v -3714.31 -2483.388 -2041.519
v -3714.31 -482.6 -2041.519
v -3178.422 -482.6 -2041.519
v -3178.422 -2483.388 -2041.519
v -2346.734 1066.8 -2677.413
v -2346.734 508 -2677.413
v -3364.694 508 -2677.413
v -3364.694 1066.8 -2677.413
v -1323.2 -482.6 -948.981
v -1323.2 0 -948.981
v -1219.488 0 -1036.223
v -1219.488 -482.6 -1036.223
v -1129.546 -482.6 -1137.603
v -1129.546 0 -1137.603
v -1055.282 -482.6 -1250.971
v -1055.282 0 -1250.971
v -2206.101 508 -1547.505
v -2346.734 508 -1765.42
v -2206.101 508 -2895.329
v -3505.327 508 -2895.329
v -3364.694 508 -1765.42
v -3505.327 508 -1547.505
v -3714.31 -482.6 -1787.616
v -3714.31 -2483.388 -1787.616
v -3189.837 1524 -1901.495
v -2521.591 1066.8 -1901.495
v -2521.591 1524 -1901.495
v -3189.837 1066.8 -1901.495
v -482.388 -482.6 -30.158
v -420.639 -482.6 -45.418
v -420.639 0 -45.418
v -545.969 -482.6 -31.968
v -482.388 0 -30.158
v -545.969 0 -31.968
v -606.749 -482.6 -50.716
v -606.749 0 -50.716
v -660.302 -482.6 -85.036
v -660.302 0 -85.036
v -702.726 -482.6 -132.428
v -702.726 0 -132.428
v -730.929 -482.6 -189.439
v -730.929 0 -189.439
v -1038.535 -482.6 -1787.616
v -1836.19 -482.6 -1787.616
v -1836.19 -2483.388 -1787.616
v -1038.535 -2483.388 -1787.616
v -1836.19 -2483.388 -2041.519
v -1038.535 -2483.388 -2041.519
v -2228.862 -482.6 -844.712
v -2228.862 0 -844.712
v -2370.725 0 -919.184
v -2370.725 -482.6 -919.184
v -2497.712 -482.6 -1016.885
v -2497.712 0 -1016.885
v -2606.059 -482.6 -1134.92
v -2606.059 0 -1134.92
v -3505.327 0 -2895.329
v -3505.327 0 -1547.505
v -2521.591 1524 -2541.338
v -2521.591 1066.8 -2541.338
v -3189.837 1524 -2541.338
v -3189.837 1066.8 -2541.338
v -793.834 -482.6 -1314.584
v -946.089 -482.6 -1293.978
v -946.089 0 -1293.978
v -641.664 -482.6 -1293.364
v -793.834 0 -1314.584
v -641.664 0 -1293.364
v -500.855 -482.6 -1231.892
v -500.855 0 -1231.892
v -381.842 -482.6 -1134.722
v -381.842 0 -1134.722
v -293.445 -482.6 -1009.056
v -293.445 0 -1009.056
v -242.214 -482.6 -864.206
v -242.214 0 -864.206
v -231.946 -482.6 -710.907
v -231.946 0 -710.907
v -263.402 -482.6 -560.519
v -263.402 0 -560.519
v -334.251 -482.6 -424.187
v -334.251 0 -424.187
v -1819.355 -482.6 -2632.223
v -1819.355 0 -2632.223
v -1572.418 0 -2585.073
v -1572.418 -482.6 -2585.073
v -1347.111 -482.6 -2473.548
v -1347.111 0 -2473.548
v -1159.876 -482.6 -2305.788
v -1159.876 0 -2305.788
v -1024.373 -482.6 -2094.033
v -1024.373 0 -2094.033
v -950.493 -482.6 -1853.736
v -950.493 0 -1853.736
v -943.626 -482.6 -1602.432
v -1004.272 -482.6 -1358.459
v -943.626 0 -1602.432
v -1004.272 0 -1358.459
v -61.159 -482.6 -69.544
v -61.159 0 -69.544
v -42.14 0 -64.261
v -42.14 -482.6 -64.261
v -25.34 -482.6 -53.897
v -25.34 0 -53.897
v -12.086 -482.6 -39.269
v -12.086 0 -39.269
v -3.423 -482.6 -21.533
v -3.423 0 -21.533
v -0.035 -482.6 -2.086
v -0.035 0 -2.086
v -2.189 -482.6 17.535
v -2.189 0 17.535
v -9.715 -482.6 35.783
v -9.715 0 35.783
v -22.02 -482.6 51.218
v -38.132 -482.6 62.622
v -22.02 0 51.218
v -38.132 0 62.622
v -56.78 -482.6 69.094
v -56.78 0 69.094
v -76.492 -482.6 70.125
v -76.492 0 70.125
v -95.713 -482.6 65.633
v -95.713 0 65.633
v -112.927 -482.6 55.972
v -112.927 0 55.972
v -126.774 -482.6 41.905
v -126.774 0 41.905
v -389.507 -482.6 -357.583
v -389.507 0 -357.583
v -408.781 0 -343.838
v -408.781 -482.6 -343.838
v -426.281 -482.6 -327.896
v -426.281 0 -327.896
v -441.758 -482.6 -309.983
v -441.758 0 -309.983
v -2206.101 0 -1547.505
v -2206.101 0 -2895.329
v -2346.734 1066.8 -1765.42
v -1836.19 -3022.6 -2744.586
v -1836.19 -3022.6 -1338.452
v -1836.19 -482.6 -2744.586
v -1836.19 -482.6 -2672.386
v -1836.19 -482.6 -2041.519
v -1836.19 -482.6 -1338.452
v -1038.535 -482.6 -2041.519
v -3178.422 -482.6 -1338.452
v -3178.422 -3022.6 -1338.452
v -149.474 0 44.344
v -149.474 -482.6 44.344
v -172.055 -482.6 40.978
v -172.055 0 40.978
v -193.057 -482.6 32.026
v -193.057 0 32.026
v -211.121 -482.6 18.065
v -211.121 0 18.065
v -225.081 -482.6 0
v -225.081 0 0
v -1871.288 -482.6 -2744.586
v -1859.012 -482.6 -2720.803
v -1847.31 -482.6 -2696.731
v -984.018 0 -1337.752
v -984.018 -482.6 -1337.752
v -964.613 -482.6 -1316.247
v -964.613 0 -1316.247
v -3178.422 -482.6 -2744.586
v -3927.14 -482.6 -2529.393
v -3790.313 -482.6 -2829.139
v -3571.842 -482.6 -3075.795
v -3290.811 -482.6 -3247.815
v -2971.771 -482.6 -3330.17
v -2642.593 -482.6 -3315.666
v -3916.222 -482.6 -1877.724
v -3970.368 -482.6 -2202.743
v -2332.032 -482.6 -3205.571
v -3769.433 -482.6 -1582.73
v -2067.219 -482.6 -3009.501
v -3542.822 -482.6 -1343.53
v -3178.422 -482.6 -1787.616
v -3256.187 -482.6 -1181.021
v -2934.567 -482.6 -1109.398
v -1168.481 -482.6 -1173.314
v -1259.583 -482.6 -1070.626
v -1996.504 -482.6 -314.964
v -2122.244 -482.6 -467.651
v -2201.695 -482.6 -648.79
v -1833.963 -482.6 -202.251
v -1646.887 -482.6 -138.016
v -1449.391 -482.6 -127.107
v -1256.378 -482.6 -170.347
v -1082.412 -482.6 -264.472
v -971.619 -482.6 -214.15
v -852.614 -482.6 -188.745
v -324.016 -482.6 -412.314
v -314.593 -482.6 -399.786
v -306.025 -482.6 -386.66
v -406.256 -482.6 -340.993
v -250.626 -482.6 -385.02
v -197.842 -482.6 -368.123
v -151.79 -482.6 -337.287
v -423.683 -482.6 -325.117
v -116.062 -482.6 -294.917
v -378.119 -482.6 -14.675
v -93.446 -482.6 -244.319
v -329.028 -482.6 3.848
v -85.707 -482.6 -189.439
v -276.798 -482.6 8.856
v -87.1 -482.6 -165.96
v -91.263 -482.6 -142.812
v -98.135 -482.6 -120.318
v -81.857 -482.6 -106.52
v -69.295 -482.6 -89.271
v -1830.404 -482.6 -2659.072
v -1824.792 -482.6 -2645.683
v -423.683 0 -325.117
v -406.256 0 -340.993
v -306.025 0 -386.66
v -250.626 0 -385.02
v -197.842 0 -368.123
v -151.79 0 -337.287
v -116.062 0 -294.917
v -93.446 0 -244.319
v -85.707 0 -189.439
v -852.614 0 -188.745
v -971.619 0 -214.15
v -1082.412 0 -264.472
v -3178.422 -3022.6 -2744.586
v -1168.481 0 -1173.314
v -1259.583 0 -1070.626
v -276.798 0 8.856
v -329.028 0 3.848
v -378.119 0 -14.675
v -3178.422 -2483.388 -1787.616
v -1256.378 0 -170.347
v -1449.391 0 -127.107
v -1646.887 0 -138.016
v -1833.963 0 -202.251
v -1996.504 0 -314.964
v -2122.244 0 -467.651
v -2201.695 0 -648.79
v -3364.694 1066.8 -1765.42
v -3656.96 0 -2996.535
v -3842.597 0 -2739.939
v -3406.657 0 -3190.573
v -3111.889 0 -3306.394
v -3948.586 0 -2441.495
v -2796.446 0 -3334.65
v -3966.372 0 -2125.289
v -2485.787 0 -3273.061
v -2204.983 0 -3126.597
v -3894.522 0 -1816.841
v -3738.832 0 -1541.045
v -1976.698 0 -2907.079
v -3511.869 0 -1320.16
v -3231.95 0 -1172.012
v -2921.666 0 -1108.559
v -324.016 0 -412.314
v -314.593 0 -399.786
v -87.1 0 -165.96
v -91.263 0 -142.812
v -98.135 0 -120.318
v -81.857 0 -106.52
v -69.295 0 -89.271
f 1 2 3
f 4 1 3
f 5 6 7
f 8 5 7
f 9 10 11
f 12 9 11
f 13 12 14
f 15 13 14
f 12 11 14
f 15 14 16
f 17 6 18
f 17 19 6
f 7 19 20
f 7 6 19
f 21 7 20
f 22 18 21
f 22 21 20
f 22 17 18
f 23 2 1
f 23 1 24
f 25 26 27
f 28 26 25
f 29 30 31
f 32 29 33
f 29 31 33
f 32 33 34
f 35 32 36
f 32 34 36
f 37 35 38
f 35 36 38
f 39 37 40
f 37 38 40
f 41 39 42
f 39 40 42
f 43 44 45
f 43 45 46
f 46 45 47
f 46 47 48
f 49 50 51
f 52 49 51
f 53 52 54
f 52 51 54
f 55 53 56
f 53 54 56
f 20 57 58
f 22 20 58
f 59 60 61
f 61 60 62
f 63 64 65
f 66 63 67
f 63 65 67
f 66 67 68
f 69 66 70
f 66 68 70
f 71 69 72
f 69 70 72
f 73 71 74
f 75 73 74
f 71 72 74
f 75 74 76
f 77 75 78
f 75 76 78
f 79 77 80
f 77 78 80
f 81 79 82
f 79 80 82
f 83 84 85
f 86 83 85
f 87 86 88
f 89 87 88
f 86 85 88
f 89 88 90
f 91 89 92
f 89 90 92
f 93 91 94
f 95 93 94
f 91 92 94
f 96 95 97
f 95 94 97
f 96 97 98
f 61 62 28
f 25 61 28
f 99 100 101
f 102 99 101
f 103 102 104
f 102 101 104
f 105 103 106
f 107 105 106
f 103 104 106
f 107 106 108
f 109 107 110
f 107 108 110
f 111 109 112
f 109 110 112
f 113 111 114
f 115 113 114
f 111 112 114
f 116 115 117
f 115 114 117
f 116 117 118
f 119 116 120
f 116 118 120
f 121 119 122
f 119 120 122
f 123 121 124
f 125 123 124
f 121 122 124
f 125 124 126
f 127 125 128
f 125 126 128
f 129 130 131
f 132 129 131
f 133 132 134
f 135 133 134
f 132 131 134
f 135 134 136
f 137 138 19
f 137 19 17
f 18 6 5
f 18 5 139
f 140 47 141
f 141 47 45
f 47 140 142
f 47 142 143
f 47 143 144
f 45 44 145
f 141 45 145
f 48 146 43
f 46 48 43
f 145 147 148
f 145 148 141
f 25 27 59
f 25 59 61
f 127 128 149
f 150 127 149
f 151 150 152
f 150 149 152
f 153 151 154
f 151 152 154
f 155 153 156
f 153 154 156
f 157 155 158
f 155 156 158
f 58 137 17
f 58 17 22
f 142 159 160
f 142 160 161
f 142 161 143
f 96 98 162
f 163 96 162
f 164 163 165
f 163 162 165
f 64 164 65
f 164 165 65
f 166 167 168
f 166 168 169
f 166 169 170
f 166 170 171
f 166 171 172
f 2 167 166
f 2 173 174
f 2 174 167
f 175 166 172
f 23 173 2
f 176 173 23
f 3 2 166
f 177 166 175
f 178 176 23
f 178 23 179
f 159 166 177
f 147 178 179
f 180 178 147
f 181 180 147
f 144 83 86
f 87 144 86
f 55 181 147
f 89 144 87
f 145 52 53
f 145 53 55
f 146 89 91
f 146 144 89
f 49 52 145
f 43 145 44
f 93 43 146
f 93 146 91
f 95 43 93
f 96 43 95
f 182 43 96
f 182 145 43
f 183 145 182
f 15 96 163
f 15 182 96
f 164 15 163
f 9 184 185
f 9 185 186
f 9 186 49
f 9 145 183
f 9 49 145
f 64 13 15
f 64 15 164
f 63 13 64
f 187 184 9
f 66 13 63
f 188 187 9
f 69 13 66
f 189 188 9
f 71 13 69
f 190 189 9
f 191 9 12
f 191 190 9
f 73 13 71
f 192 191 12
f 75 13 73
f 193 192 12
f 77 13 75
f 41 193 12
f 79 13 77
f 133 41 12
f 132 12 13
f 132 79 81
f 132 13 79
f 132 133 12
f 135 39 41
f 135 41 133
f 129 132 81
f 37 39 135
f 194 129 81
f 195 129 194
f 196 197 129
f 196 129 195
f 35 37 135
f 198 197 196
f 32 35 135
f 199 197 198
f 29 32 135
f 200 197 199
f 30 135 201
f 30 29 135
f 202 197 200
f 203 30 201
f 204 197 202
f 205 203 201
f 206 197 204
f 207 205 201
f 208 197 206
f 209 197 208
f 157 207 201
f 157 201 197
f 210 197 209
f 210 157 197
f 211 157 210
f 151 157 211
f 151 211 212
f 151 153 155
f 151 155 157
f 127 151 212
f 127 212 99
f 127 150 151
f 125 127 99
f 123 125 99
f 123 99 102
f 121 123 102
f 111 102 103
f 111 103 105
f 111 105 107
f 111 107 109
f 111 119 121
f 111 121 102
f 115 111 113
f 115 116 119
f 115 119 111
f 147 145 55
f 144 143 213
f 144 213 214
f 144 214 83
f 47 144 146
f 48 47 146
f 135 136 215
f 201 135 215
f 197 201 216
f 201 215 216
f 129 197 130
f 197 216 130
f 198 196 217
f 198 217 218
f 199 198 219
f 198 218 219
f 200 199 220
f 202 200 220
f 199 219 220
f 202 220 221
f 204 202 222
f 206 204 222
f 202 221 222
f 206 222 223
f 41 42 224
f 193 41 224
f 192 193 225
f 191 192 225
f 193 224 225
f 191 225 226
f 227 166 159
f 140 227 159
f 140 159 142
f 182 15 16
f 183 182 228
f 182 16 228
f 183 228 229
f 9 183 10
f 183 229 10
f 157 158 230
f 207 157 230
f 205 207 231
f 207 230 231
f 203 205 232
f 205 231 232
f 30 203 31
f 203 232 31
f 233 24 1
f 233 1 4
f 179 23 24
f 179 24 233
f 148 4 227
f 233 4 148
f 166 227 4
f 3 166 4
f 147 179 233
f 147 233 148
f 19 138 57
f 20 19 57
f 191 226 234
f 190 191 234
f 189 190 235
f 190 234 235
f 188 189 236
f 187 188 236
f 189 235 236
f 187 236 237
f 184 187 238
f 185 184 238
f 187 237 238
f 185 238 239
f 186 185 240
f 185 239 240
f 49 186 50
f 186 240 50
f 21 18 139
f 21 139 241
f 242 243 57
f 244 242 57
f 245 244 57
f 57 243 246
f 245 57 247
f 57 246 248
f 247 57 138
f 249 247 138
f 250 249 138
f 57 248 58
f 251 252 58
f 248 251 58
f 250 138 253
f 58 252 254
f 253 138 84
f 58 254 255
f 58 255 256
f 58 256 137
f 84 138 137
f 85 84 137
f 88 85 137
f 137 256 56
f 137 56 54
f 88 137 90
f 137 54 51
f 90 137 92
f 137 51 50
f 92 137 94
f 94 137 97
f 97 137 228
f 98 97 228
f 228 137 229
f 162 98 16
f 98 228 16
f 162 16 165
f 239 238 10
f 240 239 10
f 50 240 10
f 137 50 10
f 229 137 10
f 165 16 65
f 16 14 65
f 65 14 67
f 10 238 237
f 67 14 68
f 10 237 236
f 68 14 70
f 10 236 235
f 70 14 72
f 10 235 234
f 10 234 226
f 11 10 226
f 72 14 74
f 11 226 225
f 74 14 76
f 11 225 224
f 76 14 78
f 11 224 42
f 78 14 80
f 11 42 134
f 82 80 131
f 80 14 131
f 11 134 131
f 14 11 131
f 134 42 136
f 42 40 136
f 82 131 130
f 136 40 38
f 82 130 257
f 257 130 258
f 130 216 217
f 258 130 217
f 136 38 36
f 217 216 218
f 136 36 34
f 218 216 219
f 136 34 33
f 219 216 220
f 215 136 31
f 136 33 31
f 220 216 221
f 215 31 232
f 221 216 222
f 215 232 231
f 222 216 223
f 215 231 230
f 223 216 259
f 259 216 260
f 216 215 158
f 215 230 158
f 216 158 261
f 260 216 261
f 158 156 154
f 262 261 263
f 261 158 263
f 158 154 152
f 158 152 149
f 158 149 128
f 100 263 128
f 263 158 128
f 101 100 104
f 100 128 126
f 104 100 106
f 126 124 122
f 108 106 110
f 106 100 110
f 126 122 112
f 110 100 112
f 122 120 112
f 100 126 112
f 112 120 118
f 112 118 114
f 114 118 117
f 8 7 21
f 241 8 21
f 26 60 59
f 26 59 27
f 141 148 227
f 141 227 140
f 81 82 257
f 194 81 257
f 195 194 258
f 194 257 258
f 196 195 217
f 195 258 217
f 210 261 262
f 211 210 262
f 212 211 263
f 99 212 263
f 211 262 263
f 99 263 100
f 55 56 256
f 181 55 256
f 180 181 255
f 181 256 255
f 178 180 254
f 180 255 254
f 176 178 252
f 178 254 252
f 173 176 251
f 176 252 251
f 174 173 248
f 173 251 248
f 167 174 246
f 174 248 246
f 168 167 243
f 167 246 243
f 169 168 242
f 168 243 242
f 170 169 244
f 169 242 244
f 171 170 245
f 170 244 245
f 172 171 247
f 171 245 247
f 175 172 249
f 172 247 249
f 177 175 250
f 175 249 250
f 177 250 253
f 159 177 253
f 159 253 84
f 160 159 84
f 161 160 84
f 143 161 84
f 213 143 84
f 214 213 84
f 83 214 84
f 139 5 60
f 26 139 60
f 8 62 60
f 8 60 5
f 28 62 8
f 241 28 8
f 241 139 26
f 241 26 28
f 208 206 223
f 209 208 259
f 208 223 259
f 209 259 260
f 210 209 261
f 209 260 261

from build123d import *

# Parameters (mm, degrees)
F1_DEPTH = 482.6
F2_W     = 2675.7745742798
F2_H     = 253.9026737213
F3_DEPTH = 2000.7876753807
F4_W     = 1342.2315120697
F4_H     = 1406.1346054077
F5_DEPTH = 2540
F6_W     = 668.2456359944
F6_H     = 639.8428811592
F7_DEPTH = 1524
F6_W_2   = 1017.9599151692
F6_H_2   = 911.9933976692
F8_DEPTH = 1066.8
F6_W_3   = 1299.2261276326
F6_H_3   = 1347.8239907784
F9_DEPTH = 508


with BuildPart() as f1:
    # F0 (on Front) → F1 (new body)
    with BuildSketch(Plane.XZ):
        with BuildLine():
            ThreePointArc((-61.1587813421, -69.5440271721), (-17.4584032056, -46.2229366547), (0.0001243043, 0.1321723343))
            ThreePointArc((0.0001243043, 0.1321723343), (-48.2781404958, 66.8717179709), (-126.774106444, 41.90491734))
            ThreePointArc((-126.774106444, 41.90491734), (-77.1612759043, 10.2036931422), (-57.8562863239, -45.4175073761))
            ThreePointArc((-57.8562863239, -45.4175073761), (-58.685741649, -57.5932561294), (-61.1587813421, -69.5440271721))
        make_face()
        with BuildLine():
            ThreePointArc((-57.8562863239, -45.4175073761), (-77.1612759043, 10.2036931422), (-126.774106444, 41.90491734))
            ThreePointArc((-126.774106444, 41.90491734), (-130.8230842898, -35.5188222566), (-61.1587813421, -69.5440271721))
            ThreePointArc((-61.1587813421, -69.5440271721), (-58.685741649, -57.5932561294), (-57.8562863239, -45.4175073761))
        make_face()
        with BuildLine():
            ThreePointArc((-61.1587813421, -69.5440271721), (-130.8230842898, -35.5188222566), (-126.774106444, 41.90491734))
            ThreePointArc((-126.774106444, 41.90491734), (-182.8413638357, 37.1720147729), (-225.0809073448, 0))
            ThreePointArc((-225.0809073448, 0), (-147.6361993192, -45.4175073761), (-98.1346819036, -120.3176579167))
            ThreePointArc((-98.1346819036, -120.3176579167), (-75.0616988912, -98.2698929899), (-61.1587813421, -69.5440271721))
        make_face()
        with BuildLine():
            ThreePointArc((-98.1346819036, -120.3176579167), (-147.6361993192, -45.4175073761), (-225.0809073448, 0))
            ThreePointArc((-225.0809073448, 0), (-209.3961392236, -110.579939808), (-98.1346819036, -120.3176579167))
        make_face()
        with BuildLine():
            ThreePointArc((-98.1346819036, -120.3176579167), (-209.3961392236, -110.579939808), (-225.0809073448, 0))
            ThreePointArc((-225.0809073448, 0), (-329.0277540141, 3.8476799093), (-420.6393957138, -45.4175073761))
            ThreePointArc((-420.6393957138, -45.4175073761), (-312.5808492835, -132.0749844538), (-271.8735533906, -264.472430997))
            ThreePointArc((-271.8735533906, -264.472430997), (-280.5718237444, -327.9075156396), (-306.0245242477, -386.659791407))
            ThreePointArc((-306.0245242477, -386.659791407), (-151.7898704307, -337.2871237022), (-85.7065550505, -189.4392823832))
            ThreePointArc((-85.7065550505, -189.4392823832), (-88.8383001794, -154.3242666991), (-98.1346819036, -120.3176579167))
        make_face()
        with BuildLine():
            ThreePointArc((-271.8735533906, -264.472430997), (-312.5808492835, -132.0749844538), (-420.6393957138, -45.4175073761))
            ThreePointArc((-420.6393957138, -45.4175073761), (-481.9398537173, -173.6499014788), (-441.7581132048, -309.9830257668))
            ThreePointArc((-441.7581132048, -309.9830257668), (-414.8867984677, -332.9641578699), (-389.5072272957, -357.5827962474))
            ThreePointArc((-389.5072272957, -357.5827962474), (-349.4057088844, -376.8294041407), (-306.0245242477, -386.659791407))
            ThreePointArc((-306.0245242477, -386.659791407), (-280.5718237444, -327.9075156396), (-271.8735533906, -264.472430997))
        make_face()
        with BuildLine():
            ThreePointArc((-441.7581132048, -309.9830257668), (-481.9398537173, -173.6499014788), (-420.6393957138, -45.4175073761))
            ThreePointArc((-420.6393957138, -45.4175073761), (-606.749237141, -50.7157338644), (-730.9294342995, -189.4392823832))
            ThreePointArc((-730.9294342995, -189.4392823832), (-577.8121015841, -229.2446010815), (-441.7581132048, -309.9830257668))
        make_face()
        with BuildLine():
            ThreePointArc((-389.5072272957, -357.5827962474), (-417.7691414921, -336.128143221), (-441.7581132048, -309.9830257668))
            ThreePointArc((-441.7581132048, -309.9830257668), (-577.8121015841, -229.2446010815), (-730.9294342995, -189.4392823832))
            ThreePointArc((-730.9294342995, -189.4392823832), (-627.5521653076, -467.2807465704), (-334.2508387668, -424.1870020667))
            ThreePointArc((-334.2508387668, -424.1870020667), (-360.6005621448, -389.8242501611), (-389.5072272957, -357.5827962474))
        make_face()
        with BuildLine():
            ThreePointArc((-334.2508387668, -424.1870020667), (-627.5521653076, -467.2807465704), (-730.9294342995, -189.4392823832))
            ThreePointArc((-730.9294342995, -189.4392823832), (-912.8028414481, -198.2307656722), (-1082.4120044708, -264.472430997))
            ThreePointArc((-1082.4120044708, -264.472430997), (-866.3406898067, -519.5504866661), (-788.7418438533, -844.7120566759))
            ThreePointArc((-788.7418438533, -844.7120566759), (-829.2160706316, -1082.7237553034), (-946.0886763518, -1293.9784019955))
            ThreePointArc((-946.0886763518, -1293.9784019955), (-453.466411047, -1199.5398678136), (-230.5772327293, -750.1895065126))
            ThreePointArc((-230.5772327293, -750.1895065126), (-257.1197582476, -579.1443008696), (-334.2508387668, -424.1870020667))
        make_face()
        with BuildLine():
            ThreePointArc((-334.2508387668, -424.1870020667), (-319.200641857, -406.1281966785), (-306.0245242477, -386.659791407))
            ThreePointArc((-306.0245242477, -386.659791407), (-349.4057088844, -376.8294041407), (-389.5072272957, -357.5827962474))
            ThreePointArc((-389.5072272957, -357.5827962474), (-360.6005621448, -389.8242501611), (-334.2508387668, -424.1870020667))
        make_face()
        with BuildLine():
            ThreePointArc((-788.7418438533, -844.7120566759), (-866.3406898067, -519.5504866661), (-1082.4120044708, -264.472430997))
            ThreePointArc((-1082.4120044708, -264.472430997), (-1327.3881653616, -562.902941502), (-1323.2001896928, -948.9813660026))
            ThreePointArc((-1323.2001896928, -948.9813660026), (-1172.6686692414, -1085.2733814959), (-1055.2816970826, -1250.9705477482))
            ThreePointArc((-1055.2816970826, -1250.9705477482), (-1001.8060781577, -1275.320316043), (-946.0886763518, -1293.9784019955))
            ThreePointArc((-946.0886763518, -1293.9784019955), (-829.2160706316, -1082.7237553034), (-788.7418438533, -844.7120566759))
        make_face()
        with BuildLine():
            ThreePointArc((-1323.2001896928, -948.9813660026), (-1327.3881653616, -562.902941502), (-1082.4120044708, -264.472430997))
            ThreePointArc((-1082.4120044708, -264.472430997), (-1833.9632686946, -202.251047798), (-2228.8615535161, -844.7120566759))
            ThreePointArc((-2228.8615535161, -844.712056676), (-1762.3891427966, -778.3575145006), (-1323.2001896928, -948.9813660026))
        make_face()
        with BuildLine():
            ThreePointArc((-1055.2816970826, -1250.9705477482), (-1217.1655710564, -1124.7501031162), (-1323.2001896928, -948.9813660026))
            ThreePointArc((-1323.2001896928, -948.9813660026), (-1762.3891427966, -778.3575145006), (-2228.8615535161, -844.712056676))
            ThreePointArc((-2228.8615535161, -844.7120566759), (-1787.3647245675, -1508.7066614363), (-1004.2721469756, -1358.4591987527))
            ThreePointArc((-1004.2721469756, -1358.4591987527), (-1028.0574299289, -1303.8988753044), (-1055.2816970826, -1250.9705477482))
        make_face()
        with BuildLine():
            ThreePointArc((-1004.2721469756, -1358.4591987527), (-1787.3647245675, -1508.7066614363), (-2228.8615535161, -844.7120566759))
            ThreePointArc((-2228.8615535161, -844.712056676), (-2436.3248011036, -965.2969281577), (-2606.0588359833, -1134.9202394486))
            ThreePointArc((-2606.0588359833, -1134.9202394485), (-1983.6130756489, -1526.9802343145), (-1740.9037507317, -2221.4166588566))
            ThreePointArc((-1740.9037507317, -2221.4166588566), (-1760.6921600502, -2430.5316231108), (-1819.3548808532, -2632.2228093496))
            ThreePointArc((-1819.3548808532, -2632.2228093496), (-1193.5005596414, -2343.227960667), (-938.1873080029, -1702.8946119474))
            ThreePointArc((-938.1873080029, -1702.8946119474), (-954.8578262265, -1527.5357229478), (-1004.2721469756, -1358.4591987527))
        make_face()
        with BuildLine():
            ThreePointArc((-1004.2721469756, -1358.4591987527), (-974.2073466293, -1327.0968338925), (-946.0886763518, -1293.9784019955))
            ThreePointArc((-946.0886763518, -1293.9784019955), (-1001.8060781577, -1275.320316043), (-1055.2816970826, -1250.9705477482))
            ThreePointArc((-1055.2816970826, -1250.9705477482), (-1028.0574299289, -1303.8988753044), (-1004.2721469756, -1358.4591987527))
        make_face()
        with BuildLine():
            ThreePointArc((-1740.9037507317, -2221.4166588566), (-1983.6130756489, -1526.9802343145), (-2606.0588359833, -1134.9202394485))
            ThreePointArc((-2606.0588359833, -1134.9202394486), (-2692.6816864025, -2135.757090048), (-1819.3548808532, -2632.2228093496))
            ThreePointArc((-1819.3548808532, -2632.2228093496), (-1760.6921600502, -2430.5316231108), (-1740.9037507317, -2221.4166588566))
        make_face()
        with BuildLine():
            ThreePointArc((-1819.3548808532, -2632.2228093496), (-2692.6816864025, -2135.757090048), (-2606.0588359833, -1134.9202394486))
            ThreePointArc((-2606.0588359833, -1134.9202394485), (-3842.5966957299, -2739.9387057658), (-1819.3548808532, -2632.2228093496))
        make_face()
    extrude(amount=F1_DEPTH)

    # F2 (on face) → F3 (join)
    with BuildSketch(Plane.XZ.offset(482.6)):
        with Locations((-2376.4224052429, -1914.5678281784)):
            Rectangle(F2_W, F2_H)
    extrude(amount=F3_DEPTH)

    # F4 (on face) → F5 (join)
    with BuildSketch(Plane.XZ.offset(482.6)):
        with Locations((-2507.306098938, -2041.5191650391)):
            Rectangle(F4_W, F4_H)
    extrude(amount=F5_DEPTH)

    # F6 (on face) → F7 (join)
    with BuildSketch(Plane(origin=(0, 0, 0), x_dir=(-1, 0, 0), z_dir=(0, 1, 0))):
        with Locations((2855.7141609151, -2221.4166588566)):
            Rectangle(F6_W, F6_H)
    extrude(amount=F7_DEPTH)

    # F6 (on face) → F8 (join)
    with BuildSketch(Plane(origin=(0, 0, 0), x_dir=(-1, 0, 0), z_dir=(0, 1, 0))):
        with Locations((2855.7141609151, -2221.4166588566)):
            Rectangle(F6_W_2, F6_H_2)
        with Locations((2855.7141609151, -2221.4166588566)):
            Rectangle(F6_W, F6_H, mode=Mode.SUBTRACT)
    extrude(amount=F8_DEPTH)

    # F6 (on face) → F9 (join)
    with BuildSketch(Plane(origin=(0, 0, 0), x_dir=(-1, 0, 0), z_dir=(0, 1, 0))):
        with Locations((2855.7141609151, -2221.4166588566)):
            Rectangle(F6_W_3, F6_H_3)
        with Locations((2855.7141609151, -2221.4166588566)):
            Rectangle(F6_W_2, F6_H_2, mode=Mode.SUBTRACT)
    extrude(amount=F9_DEPTH)


solid = f1.part
